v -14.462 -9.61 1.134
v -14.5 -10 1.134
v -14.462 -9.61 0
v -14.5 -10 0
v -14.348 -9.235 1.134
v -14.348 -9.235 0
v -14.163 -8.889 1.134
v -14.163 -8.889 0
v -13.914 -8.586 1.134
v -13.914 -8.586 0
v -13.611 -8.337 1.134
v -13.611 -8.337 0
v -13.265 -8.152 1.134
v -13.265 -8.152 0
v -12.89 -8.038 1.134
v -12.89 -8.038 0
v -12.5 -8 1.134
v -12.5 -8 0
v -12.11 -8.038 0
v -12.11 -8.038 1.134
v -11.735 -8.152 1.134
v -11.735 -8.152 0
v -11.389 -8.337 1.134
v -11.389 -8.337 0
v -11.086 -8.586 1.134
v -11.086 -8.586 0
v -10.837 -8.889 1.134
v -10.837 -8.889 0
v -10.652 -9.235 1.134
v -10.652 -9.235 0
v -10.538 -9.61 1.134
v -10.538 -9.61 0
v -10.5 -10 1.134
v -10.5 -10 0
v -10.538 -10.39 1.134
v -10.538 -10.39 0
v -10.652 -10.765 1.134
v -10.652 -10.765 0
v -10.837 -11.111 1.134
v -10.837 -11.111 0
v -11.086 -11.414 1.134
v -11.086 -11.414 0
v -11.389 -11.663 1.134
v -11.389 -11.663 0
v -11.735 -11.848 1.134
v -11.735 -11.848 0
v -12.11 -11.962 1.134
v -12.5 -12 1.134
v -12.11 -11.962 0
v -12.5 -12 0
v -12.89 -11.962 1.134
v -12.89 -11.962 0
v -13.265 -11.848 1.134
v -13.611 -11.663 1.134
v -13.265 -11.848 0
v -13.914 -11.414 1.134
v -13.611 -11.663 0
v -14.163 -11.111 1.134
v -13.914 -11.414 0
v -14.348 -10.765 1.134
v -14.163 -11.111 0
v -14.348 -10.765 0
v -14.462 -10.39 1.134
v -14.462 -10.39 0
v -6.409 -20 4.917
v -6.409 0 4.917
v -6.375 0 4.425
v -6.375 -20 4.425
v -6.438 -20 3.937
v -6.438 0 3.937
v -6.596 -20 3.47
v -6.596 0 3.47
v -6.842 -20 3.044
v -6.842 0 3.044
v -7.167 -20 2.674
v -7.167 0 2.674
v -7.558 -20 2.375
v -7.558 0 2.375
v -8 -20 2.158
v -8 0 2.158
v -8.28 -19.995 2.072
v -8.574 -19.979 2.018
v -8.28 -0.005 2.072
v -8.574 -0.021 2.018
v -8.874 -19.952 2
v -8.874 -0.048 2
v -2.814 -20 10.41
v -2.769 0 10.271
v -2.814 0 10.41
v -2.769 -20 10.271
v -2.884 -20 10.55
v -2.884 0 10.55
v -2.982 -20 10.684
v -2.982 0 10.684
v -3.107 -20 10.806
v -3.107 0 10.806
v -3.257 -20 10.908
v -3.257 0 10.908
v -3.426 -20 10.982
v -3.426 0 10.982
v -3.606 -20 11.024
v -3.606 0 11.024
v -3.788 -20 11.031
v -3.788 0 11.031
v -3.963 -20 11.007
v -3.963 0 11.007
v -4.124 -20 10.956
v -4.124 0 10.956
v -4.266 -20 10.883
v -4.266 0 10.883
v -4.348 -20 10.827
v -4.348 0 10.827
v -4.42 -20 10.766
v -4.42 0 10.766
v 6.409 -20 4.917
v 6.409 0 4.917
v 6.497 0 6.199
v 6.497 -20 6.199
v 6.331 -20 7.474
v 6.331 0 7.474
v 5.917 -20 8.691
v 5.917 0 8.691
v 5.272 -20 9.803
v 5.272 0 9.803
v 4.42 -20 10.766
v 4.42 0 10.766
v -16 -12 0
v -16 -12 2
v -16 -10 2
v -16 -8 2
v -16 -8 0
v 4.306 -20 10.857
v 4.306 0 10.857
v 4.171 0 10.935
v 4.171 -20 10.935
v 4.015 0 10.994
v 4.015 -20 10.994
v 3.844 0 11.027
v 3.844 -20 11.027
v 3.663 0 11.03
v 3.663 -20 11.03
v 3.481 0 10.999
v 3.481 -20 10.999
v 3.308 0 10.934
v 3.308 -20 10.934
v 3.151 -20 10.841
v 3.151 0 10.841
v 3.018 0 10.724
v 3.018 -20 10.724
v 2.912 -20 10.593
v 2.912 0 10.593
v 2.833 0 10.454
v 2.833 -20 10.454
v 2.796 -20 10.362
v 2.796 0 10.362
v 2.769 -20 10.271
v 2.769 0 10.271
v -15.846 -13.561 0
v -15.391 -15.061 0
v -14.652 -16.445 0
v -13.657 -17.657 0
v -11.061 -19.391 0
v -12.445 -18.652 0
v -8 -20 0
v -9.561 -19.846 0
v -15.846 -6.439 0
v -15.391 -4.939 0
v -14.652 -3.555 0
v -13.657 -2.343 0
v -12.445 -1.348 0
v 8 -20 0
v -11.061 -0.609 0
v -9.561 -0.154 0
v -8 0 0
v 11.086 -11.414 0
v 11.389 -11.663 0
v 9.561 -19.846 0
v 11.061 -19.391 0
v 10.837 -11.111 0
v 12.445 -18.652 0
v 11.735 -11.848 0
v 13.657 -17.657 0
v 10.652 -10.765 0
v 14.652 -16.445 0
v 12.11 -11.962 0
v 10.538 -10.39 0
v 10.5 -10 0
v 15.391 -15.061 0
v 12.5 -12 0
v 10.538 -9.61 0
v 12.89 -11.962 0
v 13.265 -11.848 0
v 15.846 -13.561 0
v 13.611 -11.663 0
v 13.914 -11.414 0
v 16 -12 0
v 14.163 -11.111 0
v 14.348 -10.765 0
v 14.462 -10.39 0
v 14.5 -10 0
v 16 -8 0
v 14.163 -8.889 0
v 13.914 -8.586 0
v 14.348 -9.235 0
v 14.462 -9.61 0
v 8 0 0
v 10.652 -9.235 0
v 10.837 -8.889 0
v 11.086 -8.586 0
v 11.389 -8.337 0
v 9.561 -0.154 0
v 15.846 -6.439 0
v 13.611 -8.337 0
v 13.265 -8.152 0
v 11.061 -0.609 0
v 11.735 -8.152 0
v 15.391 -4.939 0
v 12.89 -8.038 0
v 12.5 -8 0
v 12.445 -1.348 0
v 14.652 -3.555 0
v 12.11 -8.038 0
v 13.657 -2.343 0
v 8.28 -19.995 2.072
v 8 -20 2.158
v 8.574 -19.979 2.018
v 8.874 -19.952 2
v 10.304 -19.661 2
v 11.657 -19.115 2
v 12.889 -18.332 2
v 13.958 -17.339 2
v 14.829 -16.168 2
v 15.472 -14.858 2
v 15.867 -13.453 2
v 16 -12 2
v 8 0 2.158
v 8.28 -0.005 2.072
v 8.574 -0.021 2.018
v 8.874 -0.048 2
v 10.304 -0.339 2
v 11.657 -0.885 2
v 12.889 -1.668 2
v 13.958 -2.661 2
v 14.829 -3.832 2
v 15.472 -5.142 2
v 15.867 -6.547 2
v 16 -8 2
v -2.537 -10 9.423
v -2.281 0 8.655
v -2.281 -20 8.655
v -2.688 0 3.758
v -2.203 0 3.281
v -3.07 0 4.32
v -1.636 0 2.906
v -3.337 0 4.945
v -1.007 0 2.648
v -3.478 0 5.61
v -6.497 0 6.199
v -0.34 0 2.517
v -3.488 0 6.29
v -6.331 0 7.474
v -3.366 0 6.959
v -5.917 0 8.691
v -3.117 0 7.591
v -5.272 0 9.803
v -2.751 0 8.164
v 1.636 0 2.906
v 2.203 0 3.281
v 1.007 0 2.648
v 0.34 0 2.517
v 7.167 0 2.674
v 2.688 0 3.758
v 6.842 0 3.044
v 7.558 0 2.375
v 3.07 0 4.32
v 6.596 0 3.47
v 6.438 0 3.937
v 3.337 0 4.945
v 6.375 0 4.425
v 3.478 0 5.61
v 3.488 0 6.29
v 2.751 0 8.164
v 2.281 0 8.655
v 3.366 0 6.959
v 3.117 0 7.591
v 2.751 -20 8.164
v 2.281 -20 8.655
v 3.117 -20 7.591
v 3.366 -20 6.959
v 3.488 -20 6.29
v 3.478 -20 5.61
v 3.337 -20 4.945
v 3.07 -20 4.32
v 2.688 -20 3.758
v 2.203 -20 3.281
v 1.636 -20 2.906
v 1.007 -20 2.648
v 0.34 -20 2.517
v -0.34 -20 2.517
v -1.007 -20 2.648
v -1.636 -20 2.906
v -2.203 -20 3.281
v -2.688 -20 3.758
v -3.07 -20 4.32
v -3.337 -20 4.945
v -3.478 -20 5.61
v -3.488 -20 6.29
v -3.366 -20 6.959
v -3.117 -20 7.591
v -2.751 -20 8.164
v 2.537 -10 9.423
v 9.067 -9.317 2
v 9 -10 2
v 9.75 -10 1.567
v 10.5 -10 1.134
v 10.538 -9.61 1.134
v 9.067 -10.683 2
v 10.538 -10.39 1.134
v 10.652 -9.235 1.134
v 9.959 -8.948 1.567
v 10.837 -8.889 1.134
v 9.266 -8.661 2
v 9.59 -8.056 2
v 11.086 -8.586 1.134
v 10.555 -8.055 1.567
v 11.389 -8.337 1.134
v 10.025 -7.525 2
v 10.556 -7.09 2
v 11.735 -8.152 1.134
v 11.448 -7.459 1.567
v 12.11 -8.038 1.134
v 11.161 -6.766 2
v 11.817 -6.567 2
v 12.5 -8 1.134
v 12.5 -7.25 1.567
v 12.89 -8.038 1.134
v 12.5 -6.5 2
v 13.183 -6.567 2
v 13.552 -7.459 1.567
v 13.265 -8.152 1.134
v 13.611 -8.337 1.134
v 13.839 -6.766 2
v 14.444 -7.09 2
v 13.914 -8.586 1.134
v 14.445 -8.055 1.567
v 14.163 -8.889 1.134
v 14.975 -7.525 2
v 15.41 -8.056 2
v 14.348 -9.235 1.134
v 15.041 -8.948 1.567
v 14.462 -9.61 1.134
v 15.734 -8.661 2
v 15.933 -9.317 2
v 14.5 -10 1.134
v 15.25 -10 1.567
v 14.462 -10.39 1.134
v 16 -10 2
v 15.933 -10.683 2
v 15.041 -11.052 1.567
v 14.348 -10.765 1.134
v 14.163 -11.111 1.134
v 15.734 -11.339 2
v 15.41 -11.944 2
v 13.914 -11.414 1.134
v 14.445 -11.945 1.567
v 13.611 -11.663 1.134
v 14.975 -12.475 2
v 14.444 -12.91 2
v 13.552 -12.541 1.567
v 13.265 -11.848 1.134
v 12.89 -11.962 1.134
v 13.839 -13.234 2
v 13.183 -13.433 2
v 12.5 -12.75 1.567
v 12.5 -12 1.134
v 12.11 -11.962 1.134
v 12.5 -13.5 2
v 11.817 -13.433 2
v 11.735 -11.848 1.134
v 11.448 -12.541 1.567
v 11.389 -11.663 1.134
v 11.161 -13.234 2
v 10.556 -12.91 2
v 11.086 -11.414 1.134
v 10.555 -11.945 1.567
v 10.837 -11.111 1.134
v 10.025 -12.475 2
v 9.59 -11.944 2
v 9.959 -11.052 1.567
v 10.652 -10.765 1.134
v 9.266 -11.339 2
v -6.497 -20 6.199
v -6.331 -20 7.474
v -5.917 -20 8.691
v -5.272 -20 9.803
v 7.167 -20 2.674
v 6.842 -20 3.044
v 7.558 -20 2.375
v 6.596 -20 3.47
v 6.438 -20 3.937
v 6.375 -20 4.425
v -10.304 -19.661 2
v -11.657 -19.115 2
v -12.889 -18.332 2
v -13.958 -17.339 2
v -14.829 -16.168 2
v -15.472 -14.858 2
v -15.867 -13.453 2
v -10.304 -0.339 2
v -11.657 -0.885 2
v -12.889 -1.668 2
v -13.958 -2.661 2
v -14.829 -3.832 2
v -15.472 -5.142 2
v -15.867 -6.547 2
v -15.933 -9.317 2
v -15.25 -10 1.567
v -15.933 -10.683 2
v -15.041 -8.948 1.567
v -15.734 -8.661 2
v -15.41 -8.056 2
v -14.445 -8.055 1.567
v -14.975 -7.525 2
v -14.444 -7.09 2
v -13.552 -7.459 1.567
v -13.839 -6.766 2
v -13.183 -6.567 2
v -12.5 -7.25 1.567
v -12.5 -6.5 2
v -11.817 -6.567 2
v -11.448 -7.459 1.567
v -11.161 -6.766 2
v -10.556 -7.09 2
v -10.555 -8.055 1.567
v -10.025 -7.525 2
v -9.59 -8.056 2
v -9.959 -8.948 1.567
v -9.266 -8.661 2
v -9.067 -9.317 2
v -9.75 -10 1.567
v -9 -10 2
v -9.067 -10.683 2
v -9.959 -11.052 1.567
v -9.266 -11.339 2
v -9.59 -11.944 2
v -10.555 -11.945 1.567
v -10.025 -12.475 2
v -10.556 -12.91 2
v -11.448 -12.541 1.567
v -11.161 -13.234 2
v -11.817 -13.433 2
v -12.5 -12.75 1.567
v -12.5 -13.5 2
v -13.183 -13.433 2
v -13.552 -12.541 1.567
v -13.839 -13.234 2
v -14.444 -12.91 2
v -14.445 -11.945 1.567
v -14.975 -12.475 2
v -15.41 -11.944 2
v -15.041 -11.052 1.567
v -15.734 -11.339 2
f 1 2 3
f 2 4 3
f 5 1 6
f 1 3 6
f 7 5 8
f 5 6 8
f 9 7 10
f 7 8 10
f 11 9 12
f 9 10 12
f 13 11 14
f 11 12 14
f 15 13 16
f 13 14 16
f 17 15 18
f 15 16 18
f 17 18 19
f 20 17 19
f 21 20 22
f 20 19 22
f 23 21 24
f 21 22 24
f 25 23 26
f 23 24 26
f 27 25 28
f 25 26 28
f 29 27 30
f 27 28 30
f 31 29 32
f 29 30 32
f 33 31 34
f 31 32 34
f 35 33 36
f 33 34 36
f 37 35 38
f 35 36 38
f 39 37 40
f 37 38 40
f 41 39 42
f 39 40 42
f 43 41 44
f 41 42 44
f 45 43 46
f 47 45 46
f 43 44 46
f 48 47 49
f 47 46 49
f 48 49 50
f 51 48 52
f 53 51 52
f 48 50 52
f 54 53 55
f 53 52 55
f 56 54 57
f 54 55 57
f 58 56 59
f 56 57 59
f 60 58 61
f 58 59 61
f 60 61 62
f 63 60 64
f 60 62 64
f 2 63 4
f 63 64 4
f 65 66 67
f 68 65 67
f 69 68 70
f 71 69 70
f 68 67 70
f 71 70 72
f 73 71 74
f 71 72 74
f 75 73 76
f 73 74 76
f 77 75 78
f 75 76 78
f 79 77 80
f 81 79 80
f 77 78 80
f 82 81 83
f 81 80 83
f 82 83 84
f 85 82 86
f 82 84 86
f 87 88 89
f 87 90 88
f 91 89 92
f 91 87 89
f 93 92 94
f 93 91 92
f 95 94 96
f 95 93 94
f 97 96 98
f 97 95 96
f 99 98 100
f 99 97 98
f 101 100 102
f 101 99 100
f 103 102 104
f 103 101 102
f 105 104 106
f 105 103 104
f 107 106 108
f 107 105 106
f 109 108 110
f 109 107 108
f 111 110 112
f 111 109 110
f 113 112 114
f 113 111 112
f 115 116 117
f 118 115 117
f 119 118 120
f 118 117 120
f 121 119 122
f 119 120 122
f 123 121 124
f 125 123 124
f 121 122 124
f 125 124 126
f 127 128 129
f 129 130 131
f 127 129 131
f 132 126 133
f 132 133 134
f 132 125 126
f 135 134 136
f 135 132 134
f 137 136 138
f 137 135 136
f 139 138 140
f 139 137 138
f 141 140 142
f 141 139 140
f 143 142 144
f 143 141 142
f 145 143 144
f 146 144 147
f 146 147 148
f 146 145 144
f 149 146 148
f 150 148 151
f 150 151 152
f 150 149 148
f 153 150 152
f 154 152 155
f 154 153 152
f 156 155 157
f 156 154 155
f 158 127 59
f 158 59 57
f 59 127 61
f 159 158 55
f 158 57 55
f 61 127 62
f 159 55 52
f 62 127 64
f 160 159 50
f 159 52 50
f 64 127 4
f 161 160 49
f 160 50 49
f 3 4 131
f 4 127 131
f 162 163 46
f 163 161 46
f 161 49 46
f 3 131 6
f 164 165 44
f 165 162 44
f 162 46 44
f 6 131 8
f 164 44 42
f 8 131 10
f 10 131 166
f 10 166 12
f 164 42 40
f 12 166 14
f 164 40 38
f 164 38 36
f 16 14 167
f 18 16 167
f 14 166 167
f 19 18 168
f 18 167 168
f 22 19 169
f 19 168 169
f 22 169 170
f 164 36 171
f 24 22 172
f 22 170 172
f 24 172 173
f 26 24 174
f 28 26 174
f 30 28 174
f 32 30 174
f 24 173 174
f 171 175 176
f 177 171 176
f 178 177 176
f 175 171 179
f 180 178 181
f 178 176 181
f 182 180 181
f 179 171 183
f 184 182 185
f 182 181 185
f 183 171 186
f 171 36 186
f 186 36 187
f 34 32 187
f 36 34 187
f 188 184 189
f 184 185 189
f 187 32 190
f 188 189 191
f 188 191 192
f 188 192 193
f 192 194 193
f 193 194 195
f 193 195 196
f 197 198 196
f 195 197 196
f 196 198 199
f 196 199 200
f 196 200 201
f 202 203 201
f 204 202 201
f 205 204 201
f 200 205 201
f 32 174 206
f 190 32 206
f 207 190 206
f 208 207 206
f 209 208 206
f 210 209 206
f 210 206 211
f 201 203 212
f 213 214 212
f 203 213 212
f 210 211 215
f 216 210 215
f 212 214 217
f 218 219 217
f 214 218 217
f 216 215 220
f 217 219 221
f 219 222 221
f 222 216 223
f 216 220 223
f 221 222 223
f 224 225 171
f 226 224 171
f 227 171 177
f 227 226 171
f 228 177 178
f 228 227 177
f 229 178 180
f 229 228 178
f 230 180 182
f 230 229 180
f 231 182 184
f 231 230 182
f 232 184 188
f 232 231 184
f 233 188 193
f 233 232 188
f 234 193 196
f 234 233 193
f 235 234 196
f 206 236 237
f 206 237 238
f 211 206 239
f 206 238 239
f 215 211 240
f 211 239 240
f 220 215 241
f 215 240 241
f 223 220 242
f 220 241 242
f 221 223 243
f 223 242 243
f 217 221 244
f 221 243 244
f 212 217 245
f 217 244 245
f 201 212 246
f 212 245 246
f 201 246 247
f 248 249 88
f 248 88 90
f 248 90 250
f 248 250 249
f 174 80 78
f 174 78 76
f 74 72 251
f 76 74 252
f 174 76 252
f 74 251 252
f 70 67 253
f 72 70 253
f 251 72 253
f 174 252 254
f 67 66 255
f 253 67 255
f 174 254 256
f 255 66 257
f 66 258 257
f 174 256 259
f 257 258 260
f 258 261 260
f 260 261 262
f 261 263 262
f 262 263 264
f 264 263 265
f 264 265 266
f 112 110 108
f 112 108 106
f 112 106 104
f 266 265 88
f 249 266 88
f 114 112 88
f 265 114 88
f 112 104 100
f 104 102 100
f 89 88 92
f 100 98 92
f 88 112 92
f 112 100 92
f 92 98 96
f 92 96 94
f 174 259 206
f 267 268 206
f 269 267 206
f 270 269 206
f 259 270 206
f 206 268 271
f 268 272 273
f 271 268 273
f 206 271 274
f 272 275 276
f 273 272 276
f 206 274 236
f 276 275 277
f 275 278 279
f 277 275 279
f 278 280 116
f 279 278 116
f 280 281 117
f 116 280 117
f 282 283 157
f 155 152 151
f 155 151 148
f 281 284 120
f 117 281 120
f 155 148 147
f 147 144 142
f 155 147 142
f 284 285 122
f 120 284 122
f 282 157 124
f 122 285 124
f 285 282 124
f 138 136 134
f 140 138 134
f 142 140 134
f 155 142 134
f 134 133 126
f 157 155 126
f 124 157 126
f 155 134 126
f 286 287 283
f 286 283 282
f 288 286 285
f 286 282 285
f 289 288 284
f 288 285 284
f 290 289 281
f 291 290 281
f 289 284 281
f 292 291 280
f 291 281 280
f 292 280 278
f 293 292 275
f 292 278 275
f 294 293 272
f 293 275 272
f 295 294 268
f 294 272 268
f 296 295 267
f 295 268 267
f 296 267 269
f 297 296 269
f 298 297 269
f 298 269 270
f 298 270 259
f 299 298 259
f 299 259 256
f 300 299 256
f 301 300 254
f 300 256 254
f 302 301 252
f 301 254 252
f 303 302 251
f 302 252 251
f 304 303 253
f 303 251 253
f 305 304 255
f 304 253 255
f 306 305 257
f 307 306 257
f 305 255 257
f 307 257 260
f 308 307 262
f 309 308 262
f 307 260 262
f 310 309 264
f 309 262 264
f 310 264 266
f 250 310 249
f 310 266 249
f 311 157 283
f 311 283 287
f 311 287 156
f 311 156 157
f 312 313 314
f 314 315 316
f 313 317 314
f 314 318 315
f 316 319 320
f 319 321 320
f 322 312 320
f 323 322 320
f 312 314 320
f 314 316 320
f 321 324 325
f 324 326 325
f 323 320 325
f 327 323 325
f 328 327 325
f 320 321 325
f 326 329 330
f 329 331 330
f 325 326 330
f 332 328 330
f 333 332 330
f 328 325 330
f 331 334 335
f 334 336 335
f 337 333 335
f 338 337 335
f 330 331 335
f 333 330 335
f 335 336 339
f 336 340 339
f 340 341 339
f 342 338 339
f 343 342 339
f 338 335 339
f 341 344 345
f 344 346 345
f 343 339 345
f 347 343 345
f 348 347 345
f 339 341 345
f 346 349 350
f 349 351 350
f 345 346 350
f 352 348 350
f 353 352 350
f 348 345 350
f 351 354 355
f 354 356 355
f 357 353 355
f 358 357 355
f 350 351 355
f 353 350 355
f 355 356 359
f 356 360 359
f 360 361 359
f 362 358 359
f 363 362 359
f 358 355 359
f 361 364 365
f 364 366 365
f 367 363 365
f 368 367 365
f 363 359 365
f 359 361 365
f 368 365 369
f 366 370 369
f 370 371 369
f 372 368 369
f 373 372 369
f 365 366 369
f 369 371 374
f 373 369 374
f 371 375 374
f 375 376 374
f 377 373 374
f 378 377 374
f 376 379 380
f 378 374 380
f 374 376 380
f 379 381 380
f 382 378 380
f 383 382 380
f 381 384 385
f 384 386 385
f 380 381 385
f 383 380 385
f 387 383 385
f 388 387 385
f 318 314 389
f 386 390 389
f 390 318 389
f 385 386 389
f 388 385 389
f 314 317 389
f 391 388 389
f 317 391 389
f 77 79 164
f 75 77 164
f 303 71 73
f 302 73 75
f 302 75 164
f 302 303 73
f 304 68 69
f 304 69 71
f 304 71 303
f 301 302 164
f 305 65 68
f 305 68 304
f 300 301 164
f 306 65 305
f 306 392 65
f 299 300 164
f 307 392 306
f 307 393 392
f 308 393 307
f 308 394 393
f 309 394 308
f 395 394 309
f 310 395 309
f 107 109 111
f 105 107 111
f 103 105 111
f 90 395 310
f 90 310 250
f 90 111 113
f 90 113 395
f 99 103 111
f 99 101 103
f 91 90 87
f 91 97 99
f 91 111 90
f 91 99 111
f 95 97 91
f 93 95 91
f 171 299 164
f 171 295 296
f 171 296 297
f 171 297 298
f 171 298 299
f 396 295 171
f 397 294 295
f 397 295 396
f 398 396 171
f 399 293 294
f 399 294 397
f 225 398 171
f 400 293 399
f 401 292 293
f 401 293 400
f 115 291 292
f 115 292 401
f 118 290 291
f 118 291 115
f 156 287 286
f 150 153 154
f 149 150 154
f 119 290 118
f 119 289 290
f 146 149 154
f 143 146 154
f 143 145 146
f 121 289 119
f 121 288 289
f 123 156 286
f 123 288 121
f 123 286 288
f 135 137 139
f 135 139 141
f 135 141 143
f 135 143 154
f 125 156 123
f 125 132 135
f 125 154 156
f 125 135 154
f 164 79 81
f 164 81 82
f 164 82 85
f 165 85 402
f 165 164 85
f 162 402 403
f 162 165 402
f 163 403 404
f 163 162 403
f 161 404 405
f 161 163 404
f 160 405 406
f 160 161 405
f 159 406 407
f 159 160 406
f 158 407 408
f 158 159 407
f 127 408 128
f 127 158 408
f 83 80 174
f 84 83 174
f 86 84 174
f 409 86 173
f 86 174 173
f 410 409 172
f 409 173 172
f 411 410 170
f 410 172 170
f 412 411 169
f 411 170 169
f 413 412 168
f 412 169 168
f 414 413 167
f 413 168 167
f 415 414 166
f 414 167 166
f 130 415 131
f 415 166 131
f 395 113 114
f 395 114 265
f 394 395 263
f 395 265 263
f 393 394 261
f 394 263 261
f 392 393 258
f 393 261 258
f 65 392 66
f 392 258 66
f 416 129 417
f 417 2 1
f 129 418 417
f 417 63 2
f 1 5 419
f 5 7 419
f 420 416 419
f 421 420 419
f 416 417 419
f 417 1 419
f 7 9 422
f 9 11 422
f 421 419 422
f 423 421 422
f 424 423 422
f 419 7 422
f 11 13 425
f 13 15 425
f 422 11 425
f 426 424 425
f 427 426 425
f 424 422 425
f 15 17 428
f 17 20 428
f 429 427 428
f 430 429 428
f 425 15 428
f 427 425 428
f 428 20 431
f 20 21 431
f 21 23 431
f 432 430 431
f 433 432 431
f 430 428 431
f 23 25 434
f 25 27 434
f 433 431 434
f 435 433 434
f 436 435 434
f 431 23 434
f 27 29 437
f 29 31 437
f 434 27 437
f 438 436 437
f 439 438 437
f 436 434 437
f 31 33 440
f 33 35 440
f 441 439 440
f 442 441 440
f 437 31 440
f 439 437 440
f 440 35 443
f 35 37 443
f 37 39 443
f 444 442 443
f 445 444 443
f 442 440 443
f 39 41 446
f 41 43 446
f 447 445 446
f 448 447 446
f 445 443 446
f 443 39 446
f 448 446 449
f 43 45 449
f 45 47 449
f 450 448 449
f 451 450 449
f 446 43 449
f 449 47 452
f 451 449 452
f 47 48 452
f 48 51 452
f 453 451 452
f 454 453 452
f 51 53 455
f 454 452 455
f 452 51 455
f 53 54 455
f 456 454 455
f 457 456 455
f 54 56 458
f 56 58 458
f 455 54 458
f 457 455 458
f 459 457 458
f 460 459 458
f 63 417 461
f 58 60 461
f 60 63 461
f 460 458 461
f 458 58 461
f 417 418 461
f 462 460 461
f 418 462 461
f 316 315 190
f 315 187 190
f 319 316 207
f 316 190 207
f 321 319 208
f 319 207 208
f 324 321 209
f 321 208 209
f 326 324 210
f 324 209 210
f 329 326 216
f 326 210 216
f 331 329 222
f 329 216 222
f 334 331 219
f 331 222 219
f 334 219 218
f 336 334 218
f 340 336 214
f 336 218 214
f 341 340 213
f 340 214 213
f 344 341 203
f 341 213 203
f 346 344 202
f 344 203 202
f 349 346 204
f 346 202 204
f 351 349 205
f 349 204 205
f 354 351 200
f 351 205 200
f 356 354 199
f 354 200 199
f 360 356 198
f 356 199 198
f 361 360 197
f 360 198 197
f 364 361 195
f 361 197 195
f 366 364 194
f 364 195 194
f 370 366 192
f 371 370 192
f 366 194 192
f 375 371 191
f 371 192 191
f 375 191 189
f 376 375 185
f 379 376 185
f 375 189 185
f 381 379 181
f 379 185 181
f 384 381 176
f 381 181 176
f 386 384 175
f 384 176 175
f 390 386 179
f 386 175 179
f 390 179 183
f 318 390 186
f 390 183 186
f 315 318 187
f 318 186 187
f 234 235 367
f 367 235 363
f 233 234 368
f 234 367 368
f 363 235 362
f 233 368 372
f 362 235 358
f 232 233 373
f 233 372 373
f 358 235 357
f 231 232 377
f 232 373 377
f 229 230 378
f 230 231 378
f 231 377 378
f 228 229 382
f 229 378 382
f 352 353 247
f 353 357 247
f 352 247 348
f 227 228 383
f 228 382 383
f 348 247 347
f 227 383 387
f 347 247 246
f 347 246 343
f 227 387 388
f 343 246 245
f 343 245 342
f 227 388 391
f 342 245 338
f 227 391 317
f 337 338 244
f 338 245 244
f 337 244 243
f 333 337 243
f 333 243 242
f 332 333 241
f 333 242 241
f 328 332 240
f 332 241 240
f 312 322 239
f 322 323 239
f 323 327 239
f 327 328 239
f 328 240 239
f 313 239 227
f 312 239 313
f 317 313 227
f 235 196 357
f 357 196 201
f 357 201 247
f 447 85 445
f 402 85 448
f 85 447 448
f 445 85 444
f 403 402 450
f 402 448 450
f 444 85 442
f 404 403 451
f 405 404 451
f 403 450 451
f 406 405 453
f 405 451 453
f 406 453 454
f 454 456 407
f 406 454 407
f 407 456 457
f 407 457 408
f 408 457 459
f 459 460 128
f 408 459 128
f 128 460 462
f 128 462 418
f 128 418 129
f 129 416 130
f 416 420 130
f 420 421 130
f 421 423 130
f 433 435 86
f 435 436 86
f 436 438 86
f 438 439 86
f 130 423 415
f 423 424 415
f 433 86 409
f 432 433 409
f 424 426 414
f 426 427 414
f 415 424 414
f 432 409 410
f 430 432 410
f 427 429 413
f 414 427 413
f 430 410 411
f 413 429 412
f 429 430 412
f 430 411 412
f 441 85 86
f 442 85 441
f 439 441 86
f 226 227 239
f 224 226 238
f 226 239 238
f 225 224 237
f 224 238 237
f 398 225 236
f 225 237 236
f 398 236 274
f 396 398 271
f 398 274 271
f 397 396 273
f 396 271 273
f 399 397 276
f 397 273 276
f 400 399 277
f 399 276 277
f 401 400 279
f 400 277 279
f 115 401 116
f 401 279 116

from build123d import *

# Parameters (mm, degrees)
F1_DEPTH       = 20
F2_R           = 1
F3_R           = 8
F5_D           = 4
F5_CSINK_D     = 7
F5_CSINK_ANGLE = 120


with BuildPart() as f1:
    # F0 (on Front) → F1 (new body)
    with BuildSketch(Plane.XZ):
        with BuildLine():
            Line((-16, 2), (-16, 0))
            Line((-16, 0), (16, 0))
            Line((16, 0), (16, 2))
            Line((16, 2), (8.8741196746, 2))
            ThreePointArc((8.8741196746, 2), (6.9647131351, 2.8862569391), (6.4090864317, 4.9166666667))
            ThreePointArc((6.4090864317, 4.9166666667), (5.8371497595, 8.8596647854), (3.0720549025, 11.7282177574))
            add(Edge.make_bspline(
                [(2.2805033402, 8.6550526389), (2.7656288893, 9.9644009916), (3.0720549025, 11.7282177574)],
                knots=[0.7096553764, 0.7096553764, 0.7096553764, 1.0711038861, 1.0711038861, 1.0711038861], degree=2, weights=[1, 0.9837137717, 1]))
            ThreePointArc((2.2805033402, 8.6550526389), (0, 2.5), (-2.2805033402, 8.6550526389))
            add(Edge.make_bspline(
                [(-3.0720549025, 11.7282177574), (-2.7656288893, 9.9644009916), (-2.2805033402, 8.6550526389)],
                knots=[5.2120814211, 5.2120814211, 5.2120814211, 5.5735299308, 5.5735299308, 5.5735299308], degree=2, weights=[1, 0.9837137717, 1]))
            ThreePointArc((-3.0720549025, 11.7282177574), (-5.8371497595, 8.8596647854), (-6.4090864317, 4.9166666667))
            ThreePointArc((-6.4090864317, 4.9166666667), (-6.9647131351, 2.8862569391), (-8.8741196746, 2))
            Line((-8.8741196746, 2), (-16, 2))
        make_face()
    extrude(amount=F1_DEPTH)

    # F2
    f2_edges = [f1.edges().sort_by_distance(p)[0] for p in [
        (-3.072055, -10, 11.728218),
        (3.072055, -10, 11.728218),
    ]]
    fillet(f2_edges, radius=F2_R)

    # F3
    f3_edges = [f1.edges().sort_by_distance(p)[0] for p in [
        (-16, -20, 1),
        (16, -20, 1),
        (16, 0, 1),
        (-16, 0, 1),
    ]]
    fillet(f3_edges, radius=F3_R)

    # F5 (through all)
    with Locations(Plane.XY.offset(2)):
        with Locations((-12.5, -10), (12.5, -10)):
            CounterSinkHole(F5_D / 2, F5_CSINK_D / 2, counter_sink_angle=F5_CSINK_ANGLE)


solid = f1.part
